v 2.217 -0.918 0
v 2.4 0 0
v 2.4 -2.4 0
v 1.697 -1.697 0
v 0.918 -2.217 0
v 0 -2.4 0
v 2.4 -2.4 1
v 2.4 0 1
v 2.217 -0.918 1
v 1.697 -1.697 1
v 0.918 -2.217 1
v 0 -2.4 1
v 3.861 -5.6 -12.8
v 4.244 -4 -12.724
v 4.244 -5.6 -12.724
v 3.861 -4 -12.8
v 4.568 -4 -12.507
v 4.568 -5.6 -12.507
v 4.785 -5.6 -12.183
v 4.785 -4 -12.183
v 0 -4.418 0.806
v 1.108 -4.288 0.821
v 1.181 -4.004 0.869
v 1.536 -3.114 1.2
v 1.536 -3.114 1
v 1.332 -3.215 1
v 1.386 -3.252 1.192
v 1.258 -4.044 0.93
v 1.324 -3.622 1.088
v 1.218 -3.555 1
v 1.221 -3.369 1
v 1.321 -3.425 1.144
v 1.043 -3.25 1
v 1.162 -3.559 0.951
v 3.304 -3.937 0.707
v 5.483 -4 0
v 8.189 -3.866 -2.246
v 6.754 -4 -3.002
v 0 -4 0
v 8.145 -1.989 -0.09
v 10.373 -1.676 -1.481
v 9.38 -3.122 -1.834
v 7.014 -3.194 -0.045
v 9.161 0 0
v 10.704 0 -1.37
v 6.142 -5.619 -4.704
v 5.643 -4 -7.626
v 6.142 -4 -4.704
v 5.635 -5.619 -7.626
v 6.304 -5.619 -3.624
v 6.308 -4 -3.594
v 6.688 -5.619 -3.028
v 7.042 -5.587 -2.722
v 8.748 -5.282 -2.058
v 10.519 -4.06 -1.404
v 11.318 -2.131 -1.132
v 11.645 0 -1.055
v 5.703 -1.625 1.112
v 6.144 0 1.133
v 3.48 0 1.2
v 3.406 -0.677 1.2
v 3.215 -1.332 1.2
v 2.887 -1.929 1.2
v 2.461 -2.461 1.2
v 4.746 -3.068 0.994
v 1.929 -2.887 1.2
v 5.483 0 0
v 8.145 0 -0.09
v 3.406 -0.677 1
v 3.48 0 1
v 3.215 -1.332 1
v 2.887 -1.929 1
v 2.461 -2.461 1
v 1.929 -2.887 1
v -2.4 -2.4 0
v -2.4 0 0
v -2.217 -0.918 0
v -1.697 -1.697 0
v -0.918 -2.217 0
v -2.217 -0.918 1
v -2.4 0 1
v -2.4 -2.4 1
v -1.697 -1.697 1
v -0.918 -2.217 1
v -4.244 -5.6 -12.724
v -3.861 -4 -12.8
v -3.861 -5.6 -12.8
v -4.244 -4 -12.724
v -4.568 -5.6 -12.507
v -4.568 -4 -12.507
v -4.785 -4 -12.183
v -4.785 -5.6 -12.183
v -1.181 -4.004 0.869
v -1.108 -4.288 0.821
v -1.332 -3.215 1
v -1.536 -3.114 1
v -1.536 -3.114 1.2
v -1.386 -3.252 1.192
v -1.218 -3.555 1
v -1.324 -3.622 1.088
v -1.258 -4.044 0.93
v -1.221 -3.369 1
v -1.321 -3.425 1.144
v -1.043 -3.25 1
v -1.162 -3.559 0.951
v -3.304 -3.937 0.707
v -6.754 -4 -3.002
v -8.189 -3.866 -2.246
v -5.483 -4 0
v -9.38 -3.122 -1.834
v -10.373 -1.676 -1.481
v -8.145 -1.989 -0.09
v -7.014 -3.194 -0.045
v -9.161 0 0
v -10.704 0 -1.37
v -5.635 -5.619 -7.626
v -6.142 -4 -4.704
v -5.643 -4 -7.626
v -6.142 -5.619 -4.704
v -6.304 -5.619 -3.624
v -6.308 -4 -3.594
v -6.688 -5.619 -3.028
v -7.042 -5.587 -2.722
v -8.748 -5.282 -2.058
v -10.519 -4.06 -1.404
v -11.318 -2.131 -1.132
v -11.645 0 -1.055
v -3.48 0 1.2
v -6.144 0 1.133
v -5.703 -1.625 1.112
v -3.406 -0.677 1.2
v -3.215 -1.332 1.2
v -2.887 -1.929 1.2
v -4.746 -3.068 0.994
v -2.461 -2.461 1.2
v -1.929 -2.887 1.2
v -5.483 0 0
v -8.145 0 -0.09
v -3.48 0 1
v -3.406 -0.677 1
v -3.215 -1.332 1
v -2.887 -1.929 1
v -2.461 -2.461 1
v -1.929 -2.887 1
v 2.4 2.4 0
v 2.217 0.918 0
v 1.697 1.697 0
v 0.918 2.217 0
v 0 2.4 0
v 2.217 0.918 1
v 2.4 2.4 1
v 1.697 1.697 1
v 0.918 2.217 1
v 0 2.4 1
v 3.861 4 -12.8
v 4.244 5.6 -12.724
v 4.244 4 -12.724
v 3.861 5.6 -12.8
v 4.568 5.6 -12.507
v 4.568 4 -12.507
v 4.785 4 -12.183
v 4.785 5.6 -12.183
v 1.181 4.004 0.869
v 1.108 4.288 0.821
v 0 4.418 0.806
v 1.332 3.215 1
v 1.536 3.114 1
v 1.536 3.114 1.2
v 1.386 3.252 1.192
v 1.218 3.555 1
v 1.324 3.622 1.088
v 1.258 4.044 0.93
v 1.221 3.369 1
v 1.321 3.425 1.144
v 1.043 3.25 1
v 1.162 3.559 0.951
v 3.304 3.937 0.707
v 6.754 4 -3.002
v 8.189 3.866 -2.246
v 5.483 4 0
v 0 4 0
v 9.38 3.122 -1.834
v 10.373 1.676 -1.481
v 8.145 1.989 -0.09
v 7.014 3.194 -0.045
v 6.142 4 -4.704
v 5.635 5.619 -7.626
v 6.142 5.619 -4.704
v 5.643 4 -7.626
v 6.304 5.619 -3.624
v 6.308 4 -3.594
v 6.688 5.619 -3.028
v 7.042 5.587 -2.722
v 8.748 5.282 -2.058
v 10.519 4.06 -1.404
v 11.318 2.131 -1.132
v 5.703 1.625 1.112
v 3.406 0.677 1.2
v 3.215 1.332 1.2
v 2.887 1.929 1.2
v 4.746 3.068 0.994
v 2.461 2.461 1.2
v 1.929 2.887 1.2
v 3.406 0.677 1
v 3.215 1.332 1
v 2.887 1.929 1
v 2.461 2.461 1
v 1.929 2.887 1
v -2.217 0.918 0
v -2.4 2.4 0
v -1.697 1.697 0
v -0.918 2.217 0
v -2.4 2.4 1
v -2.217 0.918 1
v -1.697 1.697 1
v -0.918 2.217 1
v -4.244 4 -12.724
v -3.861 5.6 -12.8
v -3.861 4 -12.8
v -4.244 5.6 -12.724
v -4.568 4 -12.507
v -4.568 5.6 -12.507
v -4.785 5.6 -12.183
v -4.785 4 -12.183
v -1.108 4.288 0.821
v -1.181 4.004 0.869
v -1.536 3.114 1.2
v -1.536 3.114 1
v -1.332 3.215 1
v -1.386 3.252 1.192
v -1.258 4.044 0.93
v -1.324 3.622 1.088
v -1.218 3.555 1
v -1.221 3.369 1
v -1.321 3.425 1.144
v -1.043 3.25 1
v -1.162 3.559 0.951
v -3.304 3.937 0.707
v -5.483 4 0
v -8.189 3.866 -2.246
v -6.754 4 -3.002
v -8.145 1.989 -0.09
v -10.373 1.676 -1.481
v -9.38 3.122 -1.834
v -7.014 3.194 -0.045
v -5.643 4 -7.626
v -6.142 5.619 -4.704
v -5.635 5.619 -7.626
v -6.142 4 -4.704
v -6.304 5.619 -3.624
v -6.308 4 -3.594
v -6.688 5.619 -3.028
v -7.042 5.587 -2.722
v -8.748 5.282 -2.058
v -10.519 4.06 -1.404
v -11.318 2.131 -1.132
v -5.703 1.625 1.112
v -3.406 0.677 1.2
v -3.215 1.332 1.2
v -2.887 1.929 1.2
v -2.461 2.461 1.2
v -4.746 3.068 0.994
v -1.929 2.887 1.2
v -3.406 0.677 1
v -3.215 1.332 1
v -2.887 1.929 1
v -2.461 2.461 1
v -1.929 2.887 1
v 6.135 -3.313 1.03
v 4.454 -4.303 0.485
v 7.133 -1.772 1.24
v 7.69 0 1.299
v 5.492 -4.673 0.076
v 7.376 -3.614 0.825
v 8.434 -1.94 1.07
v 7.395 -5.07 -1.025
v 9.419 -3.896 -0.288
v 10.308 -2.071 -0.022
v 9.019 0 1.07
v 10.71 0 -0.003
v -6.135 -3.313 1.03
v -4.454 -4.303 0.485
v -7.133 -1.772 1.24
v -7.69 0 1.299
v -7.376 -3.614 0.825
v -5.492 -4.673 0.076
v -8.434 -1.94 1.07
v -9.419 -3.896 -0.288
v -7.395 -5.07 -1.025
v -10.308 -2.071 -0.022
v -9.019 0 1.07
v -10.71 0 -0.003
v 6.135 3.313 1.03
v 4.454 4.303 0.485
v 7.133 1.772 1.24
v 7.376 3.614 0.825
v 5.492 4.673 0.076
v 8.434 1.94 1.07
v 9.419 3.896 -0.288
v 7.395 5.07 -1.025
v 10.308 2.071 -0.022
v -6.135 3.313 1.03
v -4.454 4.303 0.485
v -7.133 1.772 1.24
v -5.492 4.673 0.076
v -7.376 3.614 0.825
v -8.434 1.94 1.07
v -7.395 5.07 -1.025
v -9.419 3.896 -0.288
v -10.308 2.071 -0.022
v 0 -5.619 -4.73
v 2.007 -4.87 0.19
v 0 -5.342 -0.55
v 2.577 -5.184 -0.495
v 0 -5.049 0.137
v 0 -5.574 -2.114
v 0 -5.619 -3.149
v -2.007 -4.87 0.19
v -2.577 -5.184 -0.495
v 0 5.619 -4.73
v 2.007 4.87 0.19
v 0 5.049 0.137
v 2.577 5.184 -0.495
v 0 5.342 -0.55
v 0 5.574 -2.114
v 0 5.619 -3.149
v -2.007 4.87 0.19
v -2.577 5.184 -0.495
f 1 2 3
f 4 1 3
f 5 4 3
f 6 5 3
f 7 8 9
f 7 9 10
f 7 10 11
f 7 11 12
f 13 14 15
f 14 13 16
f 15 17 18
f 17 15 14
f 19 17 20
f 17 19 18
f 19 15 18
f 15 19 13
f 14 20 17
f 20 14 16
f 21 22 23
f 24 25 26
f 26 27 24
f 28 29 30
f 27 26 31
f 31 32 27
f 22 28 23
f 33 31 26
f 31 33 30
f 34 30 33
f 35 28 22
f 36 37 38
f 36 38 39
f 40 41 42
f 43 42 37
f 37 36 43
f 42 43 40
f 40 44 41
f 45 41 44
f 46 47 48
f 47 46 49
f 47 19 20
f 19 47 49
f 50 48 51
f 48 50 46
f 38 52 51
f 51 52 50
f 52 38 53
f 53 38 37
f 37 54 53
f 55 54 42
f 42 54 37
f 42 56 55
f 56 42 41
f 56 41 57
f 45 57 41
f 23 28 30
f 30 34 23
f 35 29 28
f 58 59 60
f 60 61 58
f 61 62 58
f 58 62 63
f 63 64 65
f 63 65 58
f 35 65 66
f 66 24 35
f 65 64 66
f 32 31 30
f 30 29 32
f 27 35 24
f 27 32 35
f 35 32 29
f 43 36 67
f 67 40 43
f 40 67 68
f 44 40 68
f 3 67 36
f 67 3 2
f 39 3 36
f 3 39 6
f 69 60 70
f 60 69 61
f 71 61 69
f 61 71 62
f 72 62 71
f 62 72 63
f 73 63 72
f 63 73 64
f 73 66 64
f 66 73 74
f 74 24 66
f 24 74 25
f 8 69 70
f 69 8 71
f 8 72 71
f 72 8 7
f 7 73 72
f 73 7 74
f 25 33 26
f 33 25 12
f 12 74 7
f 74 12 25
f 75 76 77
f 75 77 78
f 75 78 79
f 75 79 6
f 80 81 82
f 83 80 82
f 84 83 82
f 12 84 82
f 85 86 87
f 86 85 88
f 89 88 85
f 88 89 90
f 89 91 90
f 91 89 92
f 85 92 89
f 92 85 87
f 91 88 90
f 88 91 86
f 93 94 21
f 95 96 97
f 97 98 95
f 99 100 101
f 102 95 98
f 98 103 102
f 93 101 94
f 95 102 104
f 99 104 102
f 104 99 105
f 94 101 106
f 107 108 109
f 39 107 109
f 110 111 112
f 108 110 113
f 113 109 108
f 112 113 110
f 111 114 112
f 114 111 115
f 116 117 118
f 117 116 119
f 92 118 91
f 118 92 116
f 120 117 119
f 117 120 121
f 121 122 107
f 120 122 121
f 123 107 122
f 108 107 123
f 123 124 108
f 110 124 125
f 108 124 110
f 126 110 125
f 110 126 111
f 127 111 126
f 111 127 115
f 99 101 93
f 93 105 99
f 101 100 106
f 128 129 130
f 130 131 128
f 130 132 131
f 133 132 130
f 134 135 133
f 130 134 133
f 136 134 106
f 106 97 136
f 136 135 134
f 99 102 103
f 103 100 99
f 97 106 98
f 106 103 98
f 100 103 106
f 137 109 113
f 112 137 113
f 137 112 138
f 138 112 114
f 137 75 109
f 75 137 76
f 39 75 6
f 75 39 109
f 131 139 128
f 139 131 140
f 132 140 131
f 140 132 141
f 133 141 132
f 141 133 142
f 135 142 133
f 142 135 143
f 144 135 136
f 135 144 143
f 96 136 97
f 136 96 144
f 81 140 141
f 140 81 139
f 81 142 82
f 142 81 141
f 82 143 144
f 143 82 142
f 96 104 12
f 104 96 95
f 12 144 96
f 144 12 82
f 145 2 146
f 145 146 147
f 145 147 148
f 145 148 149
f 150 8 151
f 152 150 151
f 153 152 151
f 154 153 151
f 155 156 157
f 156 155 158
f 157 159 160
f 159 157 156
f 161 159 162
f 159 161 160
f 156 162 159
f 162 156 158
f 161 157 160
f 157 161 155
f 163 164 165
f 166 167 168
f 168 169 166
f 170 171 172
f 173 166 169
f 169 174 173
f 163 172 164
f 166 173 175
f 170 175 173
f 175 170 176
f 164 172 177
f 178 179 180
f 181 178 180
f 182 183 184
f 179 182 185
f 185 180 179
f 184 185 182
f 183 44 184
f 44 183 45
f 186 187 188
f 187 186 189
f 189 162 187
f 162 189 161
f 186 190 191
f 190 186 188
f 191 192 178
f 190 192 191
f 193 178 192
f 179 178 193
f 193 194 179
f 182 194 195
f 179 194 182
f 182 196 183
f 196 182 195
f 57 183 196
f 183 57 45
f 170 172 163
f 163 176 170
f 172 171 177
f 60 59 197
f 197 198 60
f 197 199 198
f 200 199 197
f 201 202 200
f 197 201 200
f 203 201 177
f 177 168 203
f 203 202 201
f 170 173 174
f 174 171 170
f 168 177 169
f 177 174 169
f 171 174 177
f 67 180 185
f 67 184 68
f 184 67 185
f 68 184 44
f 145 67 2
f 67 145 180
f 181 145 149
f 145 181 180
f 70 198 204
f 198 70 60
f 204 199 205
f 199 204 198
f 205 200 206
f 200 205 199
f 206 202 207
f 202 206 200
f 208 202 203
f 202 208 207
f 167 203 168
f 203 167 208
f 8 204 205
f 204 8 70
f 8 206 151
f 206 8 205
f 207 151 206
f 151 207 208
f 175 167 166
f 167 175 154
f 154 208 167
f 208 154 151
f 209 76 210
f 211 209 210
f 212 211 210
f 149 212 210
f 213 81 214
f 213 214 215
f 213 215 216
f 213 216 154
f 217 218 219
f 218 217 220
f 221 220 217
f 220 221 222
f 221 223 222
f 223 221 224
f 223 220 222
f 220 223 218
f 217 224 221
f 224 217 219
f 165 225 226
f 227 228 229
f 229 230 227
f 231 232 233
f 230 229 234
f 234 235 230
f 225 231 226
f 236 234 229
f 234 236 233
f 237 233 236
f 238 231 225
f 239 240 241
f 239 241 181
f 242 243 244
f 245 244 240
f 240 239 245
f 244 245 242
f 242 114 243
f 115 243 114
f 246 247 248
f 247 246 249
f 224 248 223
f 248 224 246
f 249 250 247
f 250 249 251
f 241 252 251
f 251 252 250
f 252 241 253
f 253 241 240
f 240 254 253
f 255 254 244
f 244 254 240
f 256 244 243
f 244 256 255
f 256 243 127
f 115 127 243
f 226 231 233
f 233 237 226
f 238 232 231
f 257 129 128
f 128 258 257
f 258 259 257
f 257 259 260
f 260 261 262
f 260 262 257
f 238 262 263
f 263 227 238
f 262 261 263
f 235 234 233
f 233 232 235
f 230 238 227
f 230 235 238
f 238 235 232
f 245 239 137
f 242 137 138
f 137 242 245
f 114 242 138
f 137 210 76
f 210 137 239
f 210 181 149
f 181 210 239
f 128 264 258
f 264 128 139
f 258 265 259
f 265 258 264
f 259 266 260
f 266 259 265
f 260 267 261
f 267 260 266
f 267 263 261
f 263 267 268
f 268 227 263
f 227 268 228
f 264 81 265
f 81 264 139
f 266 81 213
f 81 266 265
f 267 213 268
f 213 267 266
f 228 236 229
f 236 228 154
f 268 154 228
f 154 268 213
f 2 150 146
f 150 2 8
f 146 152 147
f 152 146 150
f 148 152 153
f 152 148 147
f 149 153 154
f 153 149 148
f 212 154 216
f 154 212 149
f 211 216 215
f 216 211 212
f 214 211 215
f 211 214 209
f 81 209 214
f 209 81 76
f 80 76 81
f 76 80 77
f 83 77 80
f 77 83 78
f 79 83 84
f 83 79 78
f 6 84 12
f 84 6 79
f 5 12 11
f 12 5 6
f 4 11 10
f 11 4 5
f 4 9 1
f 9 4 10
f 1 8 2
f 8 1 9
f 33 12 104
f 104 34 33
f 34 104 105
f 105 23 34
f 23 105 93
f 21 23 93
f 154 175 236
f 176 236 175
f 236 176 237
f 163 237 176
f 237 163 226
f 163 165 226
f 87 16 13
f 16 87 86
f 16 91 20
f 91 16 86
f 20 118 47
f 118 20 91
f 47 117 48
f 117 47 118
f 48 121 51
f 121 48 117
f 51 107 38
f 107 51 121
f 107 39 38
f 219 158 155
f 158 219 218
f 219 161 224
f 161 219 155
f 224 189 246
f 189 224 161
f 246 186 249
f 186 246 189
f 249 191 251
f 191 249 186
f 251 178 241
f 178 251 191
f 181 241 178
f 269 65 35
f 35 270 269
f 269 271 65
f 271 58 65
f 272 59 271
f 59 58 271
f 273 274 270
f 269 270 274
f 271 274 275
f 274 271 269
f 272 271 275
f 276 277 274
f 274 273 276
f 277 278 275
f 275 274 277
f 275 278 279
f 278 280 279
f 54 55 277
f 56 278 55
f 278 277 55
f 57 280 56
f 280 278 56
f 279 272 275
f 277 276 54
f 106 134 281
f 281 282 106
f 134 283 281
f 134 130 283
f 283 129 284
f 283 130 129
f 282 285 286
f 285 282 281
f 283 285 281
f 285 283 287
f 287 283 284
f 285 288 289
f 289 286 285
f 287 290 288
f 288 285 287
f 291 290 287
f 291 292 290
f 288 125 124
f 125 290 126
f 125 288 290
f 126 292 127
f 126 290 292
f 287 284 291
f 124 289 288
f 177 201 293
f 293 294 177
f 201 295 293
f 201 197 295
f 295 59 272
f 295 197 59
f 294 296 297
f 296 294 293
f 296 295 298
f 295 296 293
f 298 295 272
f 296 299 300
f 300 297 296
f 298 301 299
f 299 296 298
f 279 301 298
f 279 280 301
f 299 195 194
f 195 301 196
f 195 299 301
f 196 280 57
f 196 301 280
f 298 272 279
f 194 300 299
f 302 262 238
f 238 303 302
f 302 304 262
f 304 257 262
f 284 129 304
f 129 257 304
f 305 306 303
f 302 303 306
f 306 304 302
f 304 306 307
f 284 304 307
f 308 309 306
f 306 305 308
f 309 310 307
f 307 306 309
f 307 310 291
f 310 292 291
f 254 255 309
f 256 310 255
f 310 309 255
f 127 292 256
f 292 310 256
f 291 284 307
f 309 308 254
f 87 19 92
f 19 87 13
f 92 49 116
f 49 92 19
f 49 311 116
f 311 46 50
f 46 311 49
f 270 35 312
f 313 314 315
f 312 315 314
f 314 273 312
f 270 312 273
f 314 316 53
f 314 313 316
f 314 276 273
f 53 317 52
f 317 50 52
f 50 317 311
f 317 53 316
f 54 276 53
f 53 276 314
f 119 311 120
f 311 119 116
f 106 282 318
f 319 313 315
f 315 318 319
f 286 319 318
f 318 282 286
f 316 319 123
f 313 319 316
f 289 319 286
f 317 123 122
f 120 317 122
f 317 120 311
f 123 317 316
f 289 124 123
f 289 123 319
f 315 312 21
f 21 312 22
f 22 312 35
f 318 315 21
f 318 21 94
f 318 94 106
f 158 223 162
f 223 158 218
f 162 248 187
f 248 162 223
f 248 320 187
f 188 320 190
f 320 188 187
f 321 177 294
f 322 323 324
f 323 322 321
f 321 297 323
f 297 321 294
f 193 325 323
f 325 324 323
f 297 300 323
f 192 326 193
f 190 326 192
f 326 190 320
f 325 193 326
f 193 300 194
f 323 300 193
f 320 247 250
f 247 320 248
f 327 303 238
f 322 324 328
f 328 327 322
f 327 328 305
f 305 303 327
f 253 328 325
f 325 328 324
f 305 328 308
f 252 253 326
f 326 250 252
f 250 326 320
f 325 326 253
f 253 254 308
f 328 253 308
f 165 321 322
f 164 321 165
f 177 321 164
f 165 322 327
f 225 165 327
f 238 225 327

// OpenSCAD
use <../lib.scad>
use <s/93565s01.scad>
use <s/93565s04.scad>
function ldraw_lib__93565() = [
// 0 Minifig Body and Shoulder Armour Smooth
// 0 Name: 93565.dat
// 0 Author: Gerald Lasser [GeraldLasser]
// 0 !LDRAW_ORG Part UPDATE 2023-04
// 0 !LICENSE Licensed under CC BY 4.0 : see CAreadme.txt
// 
// 0 BFC CERTIFY CCW
  [0,"BFC","CERTIFY"],
  [0,"BFC","CCW"],
// 
// 0 !CATEGORY Minifig Neckwear
// 0 !KEYWORDS American Football, Ice Hockey
// 
// 0 !HISTORY 2013-08-14 {LEGO Digital Designer} Original part shape
// 0 !HISTORY 2021-03-08 [GeraldLasser] File preparation for LDraw Parts Tracker
// 0 !HISTORY 2023-08-25 [OrionP] Official Update 2023-04
// 
// 
// 1 16 0 0 0 1 0 0 0 1 0 0 0 1 s\93565s01.dat
  [1,16,0,0,0,1,0,0,0,1,0,0,0,1, ldraw_lib__s__93565s01()],
// 
// 1 16 0 0 0 1 0 0 0 1 0 0 0 1 s\93565s04.dat
  [1,16,0,0,0,1,0,0,0,1,0,0,0,1, ldraw_lib__s__93565s04()],
// 1 16 0 0 0 1 0 0 0 1 0 0 0 -1 s\93565s04.dat
  [1,16,0,0,0,1,0,0,0,1,0,0,0,-1, ldraw_lib__s__93565s04()],
];
module ldraw_lib__93565(step=0, col=false, unit=2/5, alt=false, line=0.2, solid=!$preview)
    makepoly(ldraw_lib__93565(), step=step, col=col, unit=unit, alt=alt, line=line, solid=solid);
ldraw_lib__93565(line=0.2);
